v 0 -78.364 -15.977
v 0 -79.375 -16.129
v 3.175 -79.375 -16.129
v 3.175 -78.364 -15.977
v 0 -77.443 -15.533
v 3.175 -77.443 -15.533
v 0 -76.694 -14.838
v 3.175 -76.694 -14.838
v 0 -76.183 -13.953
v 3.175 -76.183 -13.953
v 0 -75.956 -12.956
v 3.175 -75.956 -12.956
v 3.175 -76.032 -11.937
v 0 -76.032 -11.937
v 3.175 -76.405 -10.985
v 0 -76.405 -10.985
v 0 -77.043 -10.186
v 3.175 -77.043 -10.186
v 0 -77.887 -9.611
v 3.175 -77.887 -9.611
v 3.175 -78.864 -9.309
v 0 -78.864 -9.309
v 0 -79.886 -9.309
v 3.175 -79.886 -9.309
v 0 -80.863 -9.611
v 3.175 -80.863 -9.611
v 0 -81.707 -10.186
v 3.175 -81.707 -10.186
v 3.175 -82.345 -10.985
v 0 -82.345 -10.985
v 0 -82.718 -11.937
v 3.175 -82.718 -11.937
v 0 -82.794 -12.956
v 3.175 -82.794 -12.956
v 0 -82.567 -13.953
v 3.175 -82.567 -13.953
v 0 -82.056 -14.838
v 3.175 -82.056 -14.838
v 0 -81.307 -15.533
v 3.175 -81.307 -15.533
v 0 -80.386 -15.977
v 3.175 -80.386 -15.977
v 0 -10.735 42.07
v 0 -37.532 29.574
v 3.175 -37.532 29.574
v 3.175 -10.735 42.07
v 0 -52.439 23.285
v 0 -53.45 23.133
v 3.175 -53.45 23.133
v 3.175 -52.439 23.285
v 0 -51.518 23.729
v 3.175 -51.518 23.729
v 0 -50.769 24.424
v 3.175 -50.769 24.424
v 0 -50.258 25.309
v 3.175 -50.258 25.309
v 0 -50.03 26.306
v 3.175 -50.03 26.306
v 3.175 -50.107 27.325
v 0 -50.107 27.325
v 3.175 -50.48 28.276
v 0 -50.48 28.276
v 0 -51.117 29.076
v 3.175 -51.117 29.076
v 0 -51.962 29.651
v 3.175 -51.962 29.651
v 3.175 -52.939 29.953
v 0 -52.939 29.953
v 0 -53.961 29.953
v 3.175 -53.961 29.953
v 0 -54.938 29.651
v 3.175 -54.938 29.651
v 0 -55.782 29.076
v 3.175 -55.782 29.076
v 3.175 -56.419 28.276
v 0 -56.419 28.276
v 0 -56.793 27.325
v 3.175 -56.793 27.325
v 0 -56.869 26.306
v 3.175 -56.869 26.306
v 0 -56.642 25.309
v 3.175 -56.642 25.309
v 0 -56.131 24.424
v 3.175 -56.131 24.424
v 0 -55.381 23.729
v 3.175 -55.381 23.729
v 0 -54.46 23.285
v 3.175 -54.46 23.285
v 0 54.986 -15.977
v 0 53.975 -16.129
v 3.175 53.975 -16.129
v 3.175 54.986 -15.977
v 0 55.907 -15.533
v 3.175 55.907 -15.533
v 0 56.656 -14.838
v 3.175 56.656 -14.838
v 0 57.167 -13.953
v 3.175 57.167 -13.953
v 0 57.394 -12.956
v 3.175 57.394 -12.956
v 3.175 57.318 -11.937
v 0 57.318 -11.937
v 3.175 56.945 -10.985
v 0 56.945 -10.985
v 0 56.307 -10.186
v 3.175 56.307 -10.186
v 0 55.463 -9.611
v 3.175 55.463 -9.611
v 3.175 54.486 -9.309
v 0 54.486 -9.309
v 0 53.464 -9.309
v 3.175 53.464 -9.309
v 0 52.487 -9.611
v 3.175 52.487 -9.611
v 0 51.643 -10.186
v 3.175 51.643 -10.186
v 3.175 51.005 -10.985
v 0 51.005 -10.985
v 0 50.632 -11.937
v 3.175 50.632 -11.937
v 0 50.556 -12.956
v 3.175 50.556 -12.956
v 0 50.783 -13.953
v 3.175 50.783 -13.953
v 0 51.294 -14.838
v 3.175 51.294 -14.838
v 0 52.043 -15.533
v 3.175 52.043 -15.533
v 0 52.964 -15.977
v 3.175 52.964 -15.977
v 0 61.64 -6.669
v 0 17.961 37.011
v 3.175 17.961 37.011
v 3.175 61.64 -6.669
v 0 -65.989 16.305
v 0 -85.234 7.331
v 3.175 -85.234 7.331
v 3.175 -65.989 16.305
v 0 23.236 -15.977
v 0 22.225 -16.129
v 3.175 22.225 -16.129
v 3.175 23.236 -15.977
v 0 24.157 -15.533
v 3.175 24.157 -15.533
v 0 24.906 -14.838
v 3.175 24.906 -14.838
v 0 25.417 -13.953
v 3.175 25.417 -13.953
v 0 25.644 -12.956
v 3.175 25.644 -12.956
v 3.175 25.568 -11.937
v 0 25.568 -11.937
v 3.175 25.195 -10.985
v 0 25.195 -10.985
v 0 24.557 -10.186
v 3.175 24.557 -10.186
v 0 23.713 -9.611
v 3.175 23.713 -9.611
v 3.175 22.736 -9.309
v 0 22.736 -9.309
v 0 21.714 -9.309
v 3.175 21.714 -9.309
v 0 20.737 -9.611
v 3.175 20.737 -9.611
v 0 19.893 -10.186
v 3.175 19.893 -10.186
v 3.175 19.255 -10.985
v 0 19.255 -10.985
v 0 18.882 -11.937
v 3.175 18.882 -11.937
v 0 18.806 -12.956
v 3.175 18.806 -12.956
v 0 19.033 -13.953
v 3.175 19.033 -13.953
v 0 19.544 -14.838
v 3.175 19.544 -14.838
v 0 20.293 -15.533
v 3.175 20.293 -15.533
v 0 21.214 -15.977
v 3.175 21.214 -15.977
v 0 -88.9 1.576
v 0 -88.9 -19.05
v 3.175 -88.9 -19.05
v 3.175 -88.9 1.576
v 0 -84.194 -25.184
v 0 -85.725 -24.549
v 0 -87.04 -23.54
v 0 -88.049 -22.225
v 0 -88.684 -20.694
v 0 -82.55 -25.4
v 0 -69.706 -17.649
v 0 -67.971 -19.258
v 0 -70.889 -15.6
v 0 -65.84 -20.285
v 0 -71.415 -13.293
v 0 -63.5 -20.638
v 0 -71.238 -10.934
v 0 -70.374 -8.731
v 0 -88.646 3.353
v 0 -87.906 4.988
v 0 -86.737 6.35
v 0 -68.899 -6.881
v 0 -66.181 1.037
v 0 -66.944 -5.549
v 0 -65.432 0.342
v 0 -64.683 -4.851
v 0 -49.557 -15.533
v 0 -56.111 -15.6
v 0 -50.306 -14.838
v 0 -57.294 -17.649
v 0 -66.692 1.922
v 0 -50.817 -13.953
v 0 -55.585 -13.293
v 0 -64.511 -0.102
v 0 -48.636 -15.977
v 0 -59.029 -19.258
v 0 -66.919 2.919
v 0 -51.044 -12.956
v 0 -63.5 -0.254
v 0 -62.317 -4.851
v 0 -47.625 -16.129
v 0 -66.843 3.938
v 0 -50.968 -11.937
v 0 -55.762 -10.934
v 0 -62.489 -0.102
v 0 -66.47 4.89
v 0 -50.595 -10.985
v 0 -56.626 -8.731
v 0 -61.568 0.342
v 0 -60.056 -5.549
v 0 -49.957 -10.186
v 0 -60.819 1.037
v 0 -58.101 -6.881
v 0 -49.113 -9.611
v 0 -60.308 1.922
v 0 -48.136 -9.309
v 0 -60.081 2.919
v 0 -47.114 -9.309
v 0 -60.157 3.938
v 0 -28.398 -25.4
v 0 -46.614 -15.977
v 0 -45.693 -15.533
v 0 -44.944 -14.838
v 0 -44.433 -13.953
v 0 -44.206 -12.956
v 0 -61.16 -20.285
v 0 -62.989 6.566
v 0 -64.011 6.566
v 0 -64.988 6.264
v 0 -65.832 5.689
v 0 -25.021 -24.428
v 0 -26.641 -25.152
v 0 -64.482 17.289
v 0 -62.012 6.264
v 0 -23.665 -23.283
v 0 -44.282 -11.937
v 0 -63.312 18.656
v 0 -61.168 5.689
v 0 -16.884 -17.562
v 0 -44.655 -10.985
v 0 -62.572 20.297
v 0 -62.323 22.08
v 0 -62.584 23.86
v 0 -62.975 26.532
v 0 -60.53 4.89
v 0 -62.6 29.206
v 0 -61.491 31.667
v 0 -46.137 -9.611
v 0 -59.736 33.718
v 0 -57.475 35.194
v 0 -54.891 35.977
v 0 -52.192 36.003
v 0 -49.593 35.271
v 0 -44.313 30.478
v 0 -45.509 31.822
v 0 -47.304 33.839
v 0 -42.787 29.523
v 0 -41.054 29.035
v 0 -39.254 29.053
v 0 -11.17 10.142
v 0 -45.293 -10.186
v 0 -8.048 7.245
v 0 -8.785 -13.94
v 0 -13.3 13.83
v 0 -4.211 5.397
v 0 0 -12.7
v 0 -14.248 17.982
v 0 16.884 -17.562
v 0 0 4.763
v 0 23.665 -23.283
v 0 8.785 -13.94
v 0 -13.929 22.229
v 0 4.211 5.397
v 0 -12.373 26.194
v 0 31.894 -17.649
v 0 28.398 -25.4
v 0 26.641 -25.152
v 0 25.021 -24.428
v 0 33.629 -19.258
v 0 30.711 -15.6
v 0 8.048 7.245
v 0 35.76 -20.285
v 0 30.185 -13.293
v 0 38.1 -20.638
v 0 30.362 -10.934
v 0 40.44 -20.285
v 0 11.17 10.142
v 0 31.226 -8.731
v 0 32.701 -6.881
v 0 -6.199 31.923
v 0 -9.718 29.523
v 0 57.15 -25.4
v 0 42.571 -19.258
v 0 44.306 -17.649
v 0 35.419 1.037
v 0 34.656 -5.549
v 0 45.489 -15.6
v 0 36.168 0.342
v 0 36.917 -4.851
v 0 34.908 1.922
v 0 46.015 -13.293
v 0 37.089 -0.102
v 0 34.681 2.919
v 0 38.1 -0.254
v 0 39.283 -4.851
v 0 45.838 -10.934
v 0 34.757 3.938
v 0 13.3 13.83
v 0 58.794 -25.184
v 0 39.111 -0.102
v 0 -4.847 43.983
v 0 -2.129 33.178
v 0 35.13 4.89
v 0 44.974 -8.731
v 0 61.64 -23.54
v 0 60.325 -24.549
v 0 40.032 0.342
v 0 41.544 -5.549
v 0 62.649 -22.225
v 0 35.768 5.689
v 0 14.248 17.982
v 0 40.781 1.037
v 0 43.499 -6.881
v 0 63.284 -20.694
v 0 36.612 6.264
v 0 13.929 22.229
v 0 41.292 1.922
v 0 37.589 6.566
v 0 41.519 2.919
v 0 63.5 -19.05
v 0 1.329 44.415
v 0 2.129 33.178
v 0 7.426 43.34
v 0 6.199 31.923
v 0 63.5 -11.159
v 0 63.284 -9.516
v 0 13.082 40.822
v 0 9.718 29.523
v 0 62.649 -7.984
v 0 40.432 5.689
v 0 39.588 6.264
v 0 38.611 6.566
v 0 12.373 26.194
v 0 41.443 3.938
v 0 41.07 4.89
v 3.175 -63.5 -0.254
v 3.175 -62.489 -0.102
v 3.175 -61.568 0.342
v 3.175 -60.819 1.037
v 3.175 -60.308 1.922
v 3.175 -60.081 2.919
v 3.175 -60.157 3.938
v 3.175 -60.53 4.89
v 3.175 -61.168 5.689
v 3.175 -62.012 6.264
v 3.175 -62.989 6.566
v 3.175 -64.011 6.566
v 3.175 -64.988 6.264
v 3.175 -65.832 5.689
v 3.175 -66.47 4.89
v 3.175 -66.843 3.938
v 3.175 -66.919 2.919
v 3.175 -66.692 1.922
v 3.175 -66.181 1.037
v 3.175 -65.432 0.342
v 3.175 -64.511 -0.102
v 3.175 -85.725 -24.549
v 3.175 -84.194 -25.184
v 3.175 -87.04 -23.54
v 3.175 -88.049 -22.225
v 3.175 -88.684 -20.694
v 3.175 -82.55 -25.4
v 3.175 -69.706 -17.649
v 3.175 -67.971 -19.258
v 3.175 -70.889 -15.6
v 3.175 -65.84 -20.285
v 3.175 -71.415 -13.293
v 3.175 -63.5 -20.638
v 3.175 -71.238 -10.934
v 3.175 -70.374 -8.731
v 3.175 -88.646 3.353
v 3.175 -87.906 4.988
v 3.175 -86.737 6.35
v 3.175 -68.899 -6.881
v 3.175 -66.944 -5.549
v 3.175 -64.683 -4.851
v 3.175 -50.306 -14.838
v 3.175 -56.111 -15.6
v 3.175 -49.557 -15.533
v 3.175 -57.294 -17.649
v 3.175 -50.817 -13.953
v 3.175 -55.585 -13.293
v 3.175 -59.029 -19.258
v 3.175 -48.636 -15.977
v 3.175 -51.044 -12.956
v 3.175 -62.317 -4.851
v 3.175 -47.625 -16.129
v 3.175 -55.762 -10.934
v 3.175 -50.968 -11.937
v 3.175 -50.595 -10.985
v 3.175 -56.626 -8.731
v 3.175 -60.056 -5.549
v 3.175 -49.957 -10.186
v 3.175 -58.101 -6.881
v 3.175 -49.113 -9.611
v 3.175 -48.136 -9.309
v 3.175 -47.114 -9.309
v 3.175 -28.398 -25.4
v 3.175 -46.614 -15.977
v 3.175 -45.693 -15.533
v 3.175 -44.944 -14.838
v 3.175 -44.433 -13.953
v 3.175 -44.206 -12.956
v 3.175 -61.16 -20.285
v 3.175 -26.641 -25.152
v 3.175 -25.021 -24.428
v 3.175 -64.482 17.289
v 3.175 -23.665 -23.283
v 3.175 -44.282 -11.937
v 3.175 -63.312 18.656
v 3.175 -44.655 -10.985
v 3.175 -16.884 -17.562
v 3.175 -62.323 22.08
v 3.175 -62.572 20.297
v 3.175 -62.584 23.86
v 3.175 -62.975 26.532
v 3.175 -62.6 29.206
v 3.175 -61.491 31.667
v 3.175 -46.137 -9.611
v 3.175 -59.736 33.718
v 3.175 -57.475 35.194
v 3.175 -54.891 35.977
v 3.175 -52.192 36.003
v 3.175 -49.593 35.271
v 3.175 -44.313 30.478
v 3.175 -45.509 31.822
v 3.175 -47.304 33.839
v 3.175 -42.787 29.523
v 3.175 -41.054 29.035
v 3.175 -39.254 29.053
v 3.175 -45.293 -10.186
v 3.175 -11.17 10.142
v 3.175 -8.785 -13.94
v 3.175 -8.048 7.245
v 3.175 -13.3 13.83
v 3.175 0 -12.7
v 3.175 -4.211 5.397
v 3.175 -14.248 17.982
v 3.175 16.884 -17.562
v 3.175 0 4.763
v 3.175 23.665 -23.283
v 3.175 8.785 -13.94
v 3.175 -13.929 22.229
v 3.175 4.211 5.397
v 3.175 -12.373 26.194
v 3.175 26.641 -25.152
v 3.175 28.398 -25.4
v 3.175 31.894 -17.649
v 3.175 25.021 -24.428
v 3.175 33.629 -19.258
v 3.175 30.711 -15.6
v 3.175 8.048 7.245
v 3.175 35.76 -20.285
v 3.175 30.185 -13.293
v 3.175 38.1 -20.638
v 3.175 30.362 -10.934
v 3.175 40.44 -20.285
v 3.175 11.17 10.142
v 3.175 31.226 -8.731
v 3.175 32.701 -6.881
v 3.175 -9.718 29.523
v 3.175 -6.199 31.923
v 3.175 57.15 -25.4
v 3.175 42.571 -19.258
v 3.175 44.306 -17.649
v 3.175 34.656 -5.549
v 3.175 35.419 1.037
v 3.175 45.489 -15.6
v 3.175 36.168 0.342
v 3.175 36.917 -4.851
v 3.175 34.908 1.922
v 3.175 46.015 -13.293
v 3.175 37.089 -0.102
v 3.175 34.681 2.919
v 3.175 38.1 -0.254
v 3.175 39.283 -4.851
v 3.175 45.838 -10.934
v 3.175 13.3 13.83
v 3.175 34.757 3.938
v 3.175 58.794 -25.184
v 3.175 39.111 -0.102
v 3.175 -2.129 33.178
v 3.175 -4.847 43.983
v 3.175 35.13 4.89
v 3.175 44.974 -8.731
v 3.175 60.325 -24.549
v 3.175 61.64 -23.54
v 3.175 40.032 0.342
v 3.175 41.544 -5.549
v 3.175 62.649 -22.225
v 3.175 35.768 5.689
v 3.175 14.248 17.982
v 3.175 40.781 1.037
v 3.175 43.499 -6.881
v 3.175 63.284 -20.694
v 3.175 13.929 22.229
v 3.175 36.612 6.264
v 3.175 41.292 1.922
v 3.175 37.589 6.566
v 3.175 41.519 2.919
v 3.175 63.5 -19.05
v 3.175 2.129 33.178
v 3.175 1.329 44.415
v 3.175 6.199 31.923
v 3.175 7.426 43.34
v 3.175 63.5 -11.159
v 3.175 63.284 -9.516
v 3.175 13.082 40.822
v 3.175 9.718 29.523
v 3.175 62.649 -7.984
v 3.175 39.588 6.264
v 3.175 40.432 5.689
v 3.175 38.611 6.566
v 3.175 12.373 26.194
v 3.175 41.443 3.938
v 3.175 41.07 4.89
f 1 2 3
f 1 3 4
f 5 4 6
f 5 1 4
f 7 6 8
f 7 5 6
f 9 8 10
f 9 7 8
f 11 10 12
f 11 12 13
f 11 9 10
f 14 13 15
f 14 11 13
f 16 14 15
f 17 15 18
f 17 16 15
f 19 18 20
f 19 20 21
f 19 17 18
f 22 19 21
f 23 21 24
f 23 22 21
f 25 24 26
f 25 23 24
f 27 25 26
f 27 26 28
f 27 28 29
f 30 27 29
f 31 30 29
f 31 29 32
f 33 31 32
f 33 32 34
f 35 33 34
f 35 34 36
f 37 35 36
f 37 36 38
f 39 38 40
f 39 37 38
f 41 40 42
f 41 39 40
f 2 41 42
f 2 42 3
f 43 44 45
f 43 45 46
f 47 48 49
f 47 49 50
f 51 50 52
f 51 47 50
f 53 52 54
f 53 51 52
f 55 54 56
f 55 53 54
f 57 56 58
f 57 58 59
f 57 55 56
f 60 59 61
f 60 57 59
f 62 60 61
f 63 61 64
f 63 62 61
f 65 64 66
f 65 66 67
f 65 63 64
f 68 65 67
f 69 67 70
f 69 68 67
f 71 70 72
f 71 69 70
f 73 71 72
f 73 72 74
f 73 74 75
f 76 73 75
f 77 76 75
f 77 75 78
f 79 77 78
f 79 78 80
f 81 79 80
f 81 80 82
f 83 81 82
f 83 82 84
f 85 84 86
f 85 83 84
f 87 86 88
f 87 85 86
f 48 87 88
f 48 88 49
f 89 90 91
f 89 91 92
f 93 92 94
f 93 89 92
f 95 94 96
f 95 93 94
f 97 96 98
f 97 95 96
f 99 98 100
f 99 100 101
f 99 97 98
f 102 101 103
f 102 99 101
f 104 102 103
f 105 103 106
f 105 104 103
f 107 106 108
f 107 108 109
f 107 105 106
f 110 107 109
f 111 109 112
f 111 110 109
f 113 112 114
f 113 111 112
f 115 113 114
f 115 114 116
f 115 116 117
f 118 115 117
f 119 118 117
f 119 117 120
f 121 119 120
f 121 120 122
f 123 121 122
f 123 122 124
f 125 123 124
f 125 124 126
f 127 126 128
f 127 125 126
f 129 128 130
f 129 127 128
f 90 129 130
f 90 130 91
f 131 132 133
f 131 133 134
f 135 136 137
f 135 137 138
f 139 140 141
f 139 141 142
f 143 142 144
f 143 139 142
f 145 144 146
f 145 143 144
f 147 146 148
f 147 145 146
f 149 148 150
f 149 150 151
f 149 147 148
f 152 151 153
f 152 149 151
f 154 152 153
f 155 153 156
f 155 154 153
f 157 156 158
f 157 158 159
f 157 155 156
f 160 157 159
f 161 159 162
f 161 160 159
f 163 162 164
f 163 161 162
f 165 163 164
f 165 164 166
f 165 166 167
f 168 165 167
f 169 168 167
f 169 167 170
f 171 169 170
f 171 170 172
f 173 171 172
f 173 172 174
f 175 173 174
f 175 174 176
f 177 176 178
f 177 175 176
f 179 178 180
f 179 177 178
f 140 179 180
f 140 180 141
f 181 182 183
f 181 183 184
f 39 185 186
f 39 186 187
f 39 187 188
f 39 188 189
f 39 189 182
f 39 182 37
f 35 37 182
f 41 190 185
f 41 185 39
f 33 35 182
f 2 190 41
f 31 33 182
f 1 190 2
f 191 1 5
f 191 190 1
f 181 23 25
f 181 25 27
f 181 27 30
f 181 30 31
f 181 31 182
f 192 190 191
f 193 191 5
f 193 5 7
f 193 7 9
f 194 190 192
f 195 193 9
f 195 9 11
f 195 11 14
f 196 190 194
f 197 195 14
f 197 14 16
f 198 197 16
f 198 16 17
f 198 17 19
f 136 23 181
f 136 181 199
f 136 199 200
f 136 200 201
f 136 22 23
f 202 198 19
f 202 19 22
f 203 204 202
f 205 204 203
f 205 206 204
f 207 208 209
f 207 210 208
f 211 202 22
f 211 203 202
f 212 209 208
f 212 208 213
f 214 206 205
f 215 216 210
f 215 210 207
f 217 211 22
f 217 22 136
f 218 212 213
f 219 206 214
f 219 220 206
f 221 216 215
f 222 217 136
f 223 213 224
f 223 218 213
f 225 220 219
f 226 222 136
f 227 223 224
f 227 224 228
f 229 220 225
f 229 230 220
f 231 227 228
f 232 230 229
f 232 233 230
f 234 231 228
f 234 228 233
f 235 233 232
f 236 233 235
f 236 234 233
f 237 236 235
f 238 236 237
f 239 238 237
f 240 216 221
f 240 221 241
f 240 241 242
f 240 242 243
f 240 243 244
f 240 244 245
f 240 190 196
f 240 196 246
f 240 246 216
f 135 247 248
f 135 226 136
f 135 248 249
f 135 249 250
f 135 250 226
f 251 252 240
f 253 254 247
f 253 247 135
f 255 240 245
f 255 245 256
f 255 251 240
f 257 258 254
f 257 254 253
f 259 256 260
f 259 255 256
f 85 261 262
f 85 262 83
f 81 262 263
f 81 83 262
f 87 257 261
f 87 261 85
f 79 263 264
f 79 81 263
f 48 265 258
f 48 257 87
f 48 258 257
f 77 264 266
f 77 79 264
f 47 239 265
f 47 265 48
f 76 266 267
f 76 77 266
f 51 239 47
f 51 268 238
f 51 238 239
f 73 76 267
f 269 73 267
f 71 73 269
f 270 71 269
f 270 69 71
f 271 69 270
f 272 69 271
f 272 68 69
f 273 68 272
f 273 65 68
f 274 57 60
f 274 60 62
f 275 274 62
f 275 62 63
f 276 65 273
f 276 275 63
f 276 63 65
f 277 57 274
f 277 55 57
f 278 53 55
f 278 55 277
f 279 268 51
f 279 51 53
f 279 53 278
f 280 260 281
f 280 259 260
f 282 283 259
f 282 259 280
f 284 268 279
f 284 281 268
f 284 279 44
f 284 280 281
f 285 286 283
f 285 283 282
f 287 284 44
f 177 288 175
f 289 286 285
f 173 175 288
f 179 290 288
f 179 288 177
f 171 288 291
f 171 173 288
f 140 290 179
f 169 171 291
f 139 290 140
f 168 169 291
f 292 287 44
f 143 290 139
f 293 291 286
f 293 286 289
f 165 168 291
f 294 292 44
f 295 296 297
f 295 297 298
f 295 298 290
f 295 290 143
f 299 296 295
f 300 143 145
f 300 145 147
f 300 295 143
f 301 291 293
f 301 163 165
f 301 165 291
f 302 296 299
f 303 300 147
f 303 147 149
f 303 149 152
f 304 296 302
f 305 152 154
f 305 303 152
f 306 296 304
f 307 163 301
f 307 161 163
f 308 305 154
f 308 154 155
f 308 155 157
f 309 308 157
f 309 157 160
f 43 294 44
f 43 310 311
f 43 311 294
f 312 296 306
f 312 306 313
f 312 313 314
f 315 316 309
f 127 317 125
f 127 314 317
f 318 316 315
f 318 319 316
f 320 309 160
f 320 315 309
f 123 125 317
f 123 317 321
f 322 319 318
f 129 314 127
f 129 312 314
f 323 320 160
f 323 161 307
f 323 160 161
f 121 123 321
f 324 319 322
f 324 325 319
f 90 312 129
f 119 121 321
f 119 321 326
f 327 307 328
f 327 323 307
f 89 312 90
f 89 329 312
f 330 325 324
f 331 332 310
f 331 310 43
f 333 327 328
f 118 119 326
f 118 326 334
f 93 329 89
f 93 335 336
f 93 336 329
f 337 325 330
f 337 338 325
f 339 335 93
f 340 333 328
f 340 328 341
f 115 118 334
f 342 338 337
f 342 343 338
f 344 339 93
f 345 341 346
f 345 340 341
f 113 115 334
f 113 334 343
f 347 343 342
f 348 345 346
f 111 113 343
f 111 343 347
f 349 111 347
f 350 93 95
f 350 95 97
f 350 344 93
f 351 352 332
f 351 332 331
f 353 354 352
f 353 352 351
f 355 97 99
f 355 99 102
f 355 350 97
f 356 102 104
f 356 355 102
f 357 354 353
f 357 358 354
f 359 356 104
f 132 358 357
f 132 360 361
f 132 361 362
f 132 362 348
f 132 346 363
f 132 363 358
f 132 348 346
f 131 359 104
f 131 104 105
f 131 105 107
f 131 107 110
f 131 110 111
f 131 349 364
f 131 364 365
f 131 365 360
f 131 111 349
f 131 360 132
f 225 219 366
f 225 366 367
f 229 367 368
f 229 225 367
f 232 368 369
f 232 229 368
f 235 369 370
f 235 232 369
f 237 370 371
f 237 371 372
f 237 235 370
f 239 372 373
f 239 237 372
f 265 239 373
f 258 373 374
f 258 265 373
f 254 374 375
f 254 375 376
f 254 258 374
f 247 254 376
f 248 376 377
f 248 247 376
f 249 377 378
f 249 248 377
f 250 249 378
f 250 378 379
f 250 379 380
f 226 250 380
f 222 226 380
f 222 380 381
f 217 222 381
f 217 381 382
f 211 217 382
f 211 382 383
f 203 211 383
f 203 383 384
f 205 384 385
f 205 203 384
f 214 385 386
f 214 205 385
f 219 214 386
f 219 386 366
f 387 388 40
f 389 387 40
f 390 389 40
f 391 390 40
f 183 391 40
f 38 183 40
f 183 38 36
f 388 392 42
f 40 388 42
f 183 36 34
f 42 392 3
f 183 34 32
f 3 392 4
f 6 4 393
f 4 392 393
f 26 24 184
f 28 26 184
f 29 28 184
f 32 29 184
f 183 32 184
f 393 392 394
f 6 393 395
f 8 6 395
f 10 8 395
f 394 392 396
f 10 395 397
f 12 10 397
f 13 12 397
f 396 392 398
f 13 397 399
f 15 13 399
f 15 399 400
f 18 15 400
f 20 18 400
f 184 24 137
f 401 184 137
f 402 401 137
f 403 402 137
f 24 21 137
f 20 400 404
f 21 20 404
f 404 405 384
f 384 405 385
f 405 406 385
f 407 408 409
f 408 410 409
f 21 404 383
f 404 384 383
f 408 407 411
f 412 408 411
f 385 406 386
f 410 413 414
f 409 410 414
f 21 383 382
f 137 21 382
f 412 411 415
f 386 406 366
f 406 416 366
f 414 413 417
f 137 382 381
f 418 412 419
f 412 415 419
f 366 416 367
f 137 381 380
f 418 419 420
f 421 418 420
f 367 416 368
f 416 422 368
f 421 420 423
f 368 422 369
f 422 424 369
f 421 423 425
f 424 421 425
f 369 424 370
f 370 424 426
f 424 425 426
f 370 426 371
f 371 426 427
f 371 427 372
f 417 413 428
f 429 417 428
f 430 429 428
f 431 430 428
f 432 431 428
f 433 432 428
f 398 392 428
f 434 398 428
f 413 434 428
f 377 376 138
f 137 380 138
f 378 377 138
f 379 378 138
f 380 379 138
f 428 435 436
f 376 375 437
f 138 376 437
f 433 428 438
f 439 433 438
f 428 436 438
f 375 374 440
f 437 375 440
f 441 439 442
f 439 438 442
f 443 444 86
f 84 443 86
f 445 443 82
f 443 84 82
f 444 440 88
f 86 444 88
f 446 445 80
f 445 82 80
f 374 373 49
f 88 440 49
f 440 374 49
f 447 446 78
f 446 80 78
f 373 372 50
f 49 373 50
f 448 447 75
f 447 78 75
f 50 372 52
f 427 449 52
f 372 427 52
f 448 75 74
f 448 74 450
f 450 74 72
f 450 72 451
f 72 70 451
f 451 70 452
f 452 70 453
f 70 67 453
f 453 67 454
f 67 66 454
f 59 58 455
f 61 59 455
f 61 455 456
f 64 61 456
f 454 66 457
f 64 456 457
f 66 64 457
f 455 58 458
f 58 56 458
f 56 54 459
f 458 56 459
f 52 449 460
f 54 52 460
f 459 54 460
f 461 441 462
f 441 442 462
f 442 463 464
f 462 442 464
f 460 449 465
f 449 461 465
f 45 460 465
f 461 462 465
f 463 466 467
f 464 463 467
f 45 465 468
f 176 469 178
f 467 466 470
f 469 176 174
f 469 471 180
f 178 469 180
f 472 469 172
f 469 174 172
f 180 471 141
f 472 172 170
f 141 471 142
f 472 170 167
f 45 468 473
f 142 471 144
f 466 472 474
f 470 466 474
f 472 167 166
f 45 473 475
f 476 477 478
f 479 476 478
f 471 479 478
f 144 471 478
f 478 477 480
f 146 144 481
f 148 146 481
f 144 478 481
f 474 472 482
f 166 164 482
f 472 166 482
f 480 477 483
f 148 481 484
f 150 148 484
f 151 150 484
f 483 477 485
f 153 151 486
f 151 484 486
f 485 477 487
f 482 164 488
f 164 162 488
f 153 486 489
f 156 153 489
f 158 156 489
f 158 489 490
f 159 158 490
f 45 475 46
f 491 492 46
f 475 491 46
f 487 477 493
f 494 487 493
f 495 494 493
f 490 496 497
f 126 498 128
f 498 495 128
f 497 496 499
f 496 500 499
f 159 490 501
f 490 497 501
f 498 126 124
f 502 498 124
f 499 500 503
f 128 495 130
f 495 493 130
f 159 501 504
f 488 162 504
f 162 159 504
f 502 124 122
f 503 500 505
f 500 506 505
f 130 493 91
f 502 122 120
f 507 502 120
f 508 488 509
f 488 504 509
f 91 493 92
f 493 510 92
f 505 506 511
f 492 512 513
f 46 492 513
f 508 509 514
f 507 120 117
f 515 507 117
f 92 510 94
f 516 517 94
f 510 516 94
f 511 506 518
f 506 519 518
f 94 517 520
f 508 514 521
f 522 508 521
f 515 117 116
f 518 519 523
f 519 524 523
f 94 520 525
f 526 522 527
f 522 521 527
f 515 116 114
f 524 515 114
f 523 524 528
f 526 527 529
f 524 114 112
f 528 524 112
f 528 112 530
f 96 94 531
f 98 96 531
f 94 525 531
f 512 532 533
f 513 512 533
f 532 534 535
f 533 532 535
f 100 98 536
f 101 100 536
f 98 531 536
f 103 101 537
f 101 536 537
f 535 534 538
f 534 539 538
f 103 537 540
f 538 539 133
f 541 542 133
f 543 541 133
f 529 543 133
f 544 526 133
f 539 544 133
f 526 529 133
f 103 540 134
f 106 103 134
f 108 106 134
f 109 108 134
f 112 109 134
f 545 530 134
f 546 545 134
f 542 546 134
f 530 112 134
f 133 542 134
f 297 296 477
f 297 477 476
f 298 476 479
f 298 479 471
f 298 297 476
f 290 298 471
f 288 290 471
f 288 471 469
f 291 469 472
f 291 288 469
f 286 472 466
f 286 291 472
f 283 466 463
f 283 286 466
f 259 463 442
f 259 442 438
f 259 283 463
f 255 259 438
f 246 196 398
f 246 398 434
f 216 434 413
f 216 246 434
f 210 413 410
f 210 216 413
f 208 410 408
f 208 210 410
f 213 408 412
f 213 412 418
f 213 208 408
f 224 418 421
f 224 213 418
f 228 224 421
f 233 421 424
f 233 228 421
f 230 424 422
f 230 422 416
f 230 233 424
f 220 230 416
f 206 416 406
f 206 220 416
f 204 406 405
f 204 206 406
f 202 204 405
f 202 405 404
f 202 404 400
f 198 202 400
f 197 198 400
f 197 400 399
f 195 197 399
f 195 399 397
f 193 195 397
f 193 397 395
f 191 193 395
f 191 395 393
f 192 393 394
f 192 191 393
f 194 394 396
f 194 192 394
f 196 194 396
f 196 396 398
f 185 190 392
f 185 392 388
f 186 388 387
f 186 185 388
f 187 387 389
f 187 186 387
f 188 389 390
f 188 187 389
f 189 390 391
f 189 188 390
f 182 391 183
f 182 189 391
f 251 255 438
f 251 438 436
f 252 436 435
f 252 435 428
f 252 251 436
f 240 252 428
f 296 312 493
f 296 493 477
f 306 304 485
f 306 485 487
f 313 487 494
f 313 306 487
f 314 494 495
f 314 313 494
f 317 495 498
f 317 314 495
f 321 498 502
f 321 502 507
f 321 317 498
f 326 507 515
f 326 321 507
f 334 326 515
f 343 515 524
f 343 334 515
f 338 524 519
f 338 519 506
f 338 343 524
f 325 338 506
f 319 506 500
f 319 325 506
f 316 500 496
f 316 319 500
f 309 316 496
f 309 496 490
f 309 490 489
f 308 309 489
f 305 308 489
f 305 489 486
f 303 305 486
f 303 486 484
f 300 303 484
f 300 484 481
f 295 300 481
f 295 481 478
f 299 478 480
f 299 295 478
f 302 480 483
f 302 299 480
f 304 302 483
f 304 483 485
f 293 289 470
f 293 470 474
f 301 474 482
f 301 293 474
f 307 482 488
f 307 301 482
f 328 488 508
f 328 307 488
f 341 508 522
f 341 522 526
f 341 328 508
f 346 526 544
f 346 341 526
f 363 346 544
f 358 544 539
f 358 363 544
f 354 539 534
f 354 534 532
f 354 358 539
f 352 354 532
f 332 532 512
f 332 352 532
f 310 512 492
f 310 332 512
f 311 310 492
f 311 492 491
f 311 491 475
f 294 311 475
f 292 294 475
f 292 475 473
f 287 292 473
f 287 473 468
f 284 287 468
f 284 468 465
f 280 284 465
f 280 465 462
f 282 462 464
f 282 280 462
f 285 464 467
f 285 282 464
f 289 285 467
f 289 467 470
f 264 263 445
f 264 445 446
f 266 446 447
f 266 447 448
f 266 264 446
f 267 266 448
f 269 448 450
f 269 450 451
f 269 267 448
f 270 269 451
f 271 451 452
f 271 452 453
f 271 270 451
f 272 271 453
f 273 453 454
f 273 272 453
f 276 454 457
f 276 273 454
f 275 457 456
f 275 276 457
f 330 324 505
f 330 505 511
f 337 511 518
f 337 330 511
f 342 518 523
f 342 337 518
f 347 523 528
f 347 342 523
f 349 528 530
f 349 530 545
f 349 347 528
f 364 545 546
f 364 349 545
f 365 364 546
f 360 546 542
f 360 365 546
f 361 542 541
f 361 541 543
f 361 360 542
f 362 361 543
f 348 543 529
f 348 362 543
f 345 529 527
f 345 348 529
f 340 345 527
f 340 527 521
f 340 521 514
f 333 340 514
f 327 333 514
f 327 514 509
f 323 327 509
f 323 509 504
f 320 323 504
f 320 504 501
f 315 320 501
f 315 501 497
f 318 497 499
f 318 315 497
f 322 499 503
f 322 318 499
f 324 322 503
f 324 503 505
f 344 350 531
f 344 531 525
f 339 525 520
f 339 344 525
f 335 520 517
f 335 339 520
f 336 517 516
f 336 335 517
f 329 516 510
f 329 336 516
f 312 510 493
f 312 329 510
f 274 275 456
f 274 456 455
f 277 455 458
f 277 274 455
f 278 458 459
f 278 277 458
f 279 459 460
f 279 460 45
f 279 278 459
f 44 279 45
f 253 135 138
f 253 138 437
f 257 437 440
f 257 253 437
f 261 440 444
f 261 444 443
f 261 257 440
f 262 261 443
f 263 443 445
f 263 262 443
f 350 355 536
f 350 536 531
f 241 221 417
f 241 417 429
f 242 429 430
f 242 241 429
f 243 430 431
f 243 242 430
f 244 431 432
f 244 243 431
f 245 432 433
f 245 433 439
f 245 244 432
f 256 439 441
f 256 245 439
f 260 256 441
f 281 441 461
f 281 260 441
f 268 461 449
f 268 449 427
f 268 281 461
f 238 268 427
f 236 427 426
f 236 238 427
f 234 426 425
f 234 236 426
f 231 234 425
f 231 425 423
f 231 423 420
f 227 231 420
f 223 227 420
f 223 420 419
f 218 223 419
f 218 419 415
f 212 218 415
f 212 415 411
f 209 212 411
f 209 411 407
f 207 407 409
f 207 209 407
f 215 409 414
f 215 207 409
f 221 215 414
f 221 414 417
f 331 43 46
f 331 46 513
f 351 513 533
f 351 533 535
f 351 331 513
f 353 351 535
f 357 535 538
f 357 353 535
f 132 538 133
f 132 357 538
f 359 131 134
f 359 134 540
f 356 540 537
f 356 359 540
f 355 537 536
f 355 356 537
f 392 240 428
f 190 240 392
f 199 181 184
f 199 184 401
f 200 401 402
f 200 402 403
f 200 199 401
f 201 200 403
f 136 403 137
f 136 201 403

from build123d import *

# Parameters (mm, degrees)
SKETCH1_R           = 14.2875
SKETCH1_R_2         = 7.9375
SKETCH1_R_3         = 3.429
BOSS_EXTRUDE1_DEPTH = 3.175


with BuildPart() as part:
    # Sketch1 → Boss-Extrude1 (new body)
    with BuildSketch(Plane(origin=(0, 0, 0), x_dir=(0, 0, -1), z_dir=(1, 0, 0))):
        with BuildLine():
            Line((25.4, 57.15), (25.4, 28.398063314))
            ThreePointArc((25.4, 28.398063314), (24.8467304, 25.80568667), (23.283333333, 23.665052762))
            ThreePointArc((23.283333333, 23.665052762), (12.7, 0), (23.283333333, -23.665052762))
            ThreePointArc((23.283333333, -23.665052762), (24.8467304, -25.80568667), (25.4, -28.398063314))
            Line((25.4, -28.398063314), (25.4, -82.55))
            ThreePointArc((25.4, -82.55), (23.540128061, -87.040128061), (19.05, -88.9))
            Line((19.05, -88.9), (-1.575652176, -88.9))
            ThreePointArc((-1.575652176, -88.9), (-4.987504689, -87.905535681), (-7.330706623, -85.233625962))
            Line((-7.330706623, -85.233625962), (-16.304501832, -65.989260033))
            ThreePointArc((-16.304501832, -65.989260033), (-19.450268482, -62.883748133), (-23.860481018, -62.583619201))
            ThreePointArc((-23.860481018, -62.583619201), (-35.194449796, -57.475157953), (-31.822423449, -45.509178558))
            ThreePointArc((-31.822423449, -45.509178558), (-29.217505575, -41.937840594), (-29.574405884, -37.53185896))
            Line((-29.574405884, -37.53185896), (-42.070217791, -10.734503848))
            ThreePointArc((-42.070217791, -10.734503848), (-44.064116927, 4.410663713), (-37.010512242, 17.960512242))
            Line((-37.010512242, 17.960512242), (6.669103576, 61.640128061))
            ThreePointArc((6.669103576, 61.640128061), (8.729191841, 63.016635031), (11.159231637, 63.5))
            Line((11.159231637, 63.5), (19.05, 63.5))
            ThreePointArc((19.05, 63.5), (23.540128061, 61.640128061), (25.4, 57.15))
        make_face()
        with Locations((-19.05, 0)):
            Circle(SKETCH1_R, mode=Mode.SUBTRACT)
        with Locations((12.7, 38.1)):
            Circle(SKETCH1_R_2, mode=Mode.SUBTRACT)
        with Locations((12.7, -63.5)):
            Circle(SKETCH1_R_2, mode=Mode.SUBTRACT)
        with Locations((-26.561868124, -53.44971901)):
            Circle(SKETCH1_R_3, mode=Mode.SUBTRACT)
        with Locations((12.7, 53.975)):
            Circle(SKETCH1_R_3, mode=Mode.SUBTRACT)
        with Locations((-3.175, -63.5)):
            Circle(SKETCH1_R_3, mode=Mode.SUBTRACT)
        with Locations((12.7, -47.625)):
            Circle(SKETCH1_R_3, mode=Mode.SUBTRACT)
        with Locations((12.7, -79.375)):
            Circle(SKETCH1_R_3, mode=Mode.SUBTRACT)
        with Locations((-3.175, 38.1)):
            Circle(SKETCH1_R_3, mode=Mode.SUBTRACT)
        with Locations((12.7, 22.225)):
            Circle(SKETCH1_R_3, mode=Mode.SUBTRACT)
    extrude(amount=BOSS_EXTRUDE1_DEPTH)


solid = part.part
